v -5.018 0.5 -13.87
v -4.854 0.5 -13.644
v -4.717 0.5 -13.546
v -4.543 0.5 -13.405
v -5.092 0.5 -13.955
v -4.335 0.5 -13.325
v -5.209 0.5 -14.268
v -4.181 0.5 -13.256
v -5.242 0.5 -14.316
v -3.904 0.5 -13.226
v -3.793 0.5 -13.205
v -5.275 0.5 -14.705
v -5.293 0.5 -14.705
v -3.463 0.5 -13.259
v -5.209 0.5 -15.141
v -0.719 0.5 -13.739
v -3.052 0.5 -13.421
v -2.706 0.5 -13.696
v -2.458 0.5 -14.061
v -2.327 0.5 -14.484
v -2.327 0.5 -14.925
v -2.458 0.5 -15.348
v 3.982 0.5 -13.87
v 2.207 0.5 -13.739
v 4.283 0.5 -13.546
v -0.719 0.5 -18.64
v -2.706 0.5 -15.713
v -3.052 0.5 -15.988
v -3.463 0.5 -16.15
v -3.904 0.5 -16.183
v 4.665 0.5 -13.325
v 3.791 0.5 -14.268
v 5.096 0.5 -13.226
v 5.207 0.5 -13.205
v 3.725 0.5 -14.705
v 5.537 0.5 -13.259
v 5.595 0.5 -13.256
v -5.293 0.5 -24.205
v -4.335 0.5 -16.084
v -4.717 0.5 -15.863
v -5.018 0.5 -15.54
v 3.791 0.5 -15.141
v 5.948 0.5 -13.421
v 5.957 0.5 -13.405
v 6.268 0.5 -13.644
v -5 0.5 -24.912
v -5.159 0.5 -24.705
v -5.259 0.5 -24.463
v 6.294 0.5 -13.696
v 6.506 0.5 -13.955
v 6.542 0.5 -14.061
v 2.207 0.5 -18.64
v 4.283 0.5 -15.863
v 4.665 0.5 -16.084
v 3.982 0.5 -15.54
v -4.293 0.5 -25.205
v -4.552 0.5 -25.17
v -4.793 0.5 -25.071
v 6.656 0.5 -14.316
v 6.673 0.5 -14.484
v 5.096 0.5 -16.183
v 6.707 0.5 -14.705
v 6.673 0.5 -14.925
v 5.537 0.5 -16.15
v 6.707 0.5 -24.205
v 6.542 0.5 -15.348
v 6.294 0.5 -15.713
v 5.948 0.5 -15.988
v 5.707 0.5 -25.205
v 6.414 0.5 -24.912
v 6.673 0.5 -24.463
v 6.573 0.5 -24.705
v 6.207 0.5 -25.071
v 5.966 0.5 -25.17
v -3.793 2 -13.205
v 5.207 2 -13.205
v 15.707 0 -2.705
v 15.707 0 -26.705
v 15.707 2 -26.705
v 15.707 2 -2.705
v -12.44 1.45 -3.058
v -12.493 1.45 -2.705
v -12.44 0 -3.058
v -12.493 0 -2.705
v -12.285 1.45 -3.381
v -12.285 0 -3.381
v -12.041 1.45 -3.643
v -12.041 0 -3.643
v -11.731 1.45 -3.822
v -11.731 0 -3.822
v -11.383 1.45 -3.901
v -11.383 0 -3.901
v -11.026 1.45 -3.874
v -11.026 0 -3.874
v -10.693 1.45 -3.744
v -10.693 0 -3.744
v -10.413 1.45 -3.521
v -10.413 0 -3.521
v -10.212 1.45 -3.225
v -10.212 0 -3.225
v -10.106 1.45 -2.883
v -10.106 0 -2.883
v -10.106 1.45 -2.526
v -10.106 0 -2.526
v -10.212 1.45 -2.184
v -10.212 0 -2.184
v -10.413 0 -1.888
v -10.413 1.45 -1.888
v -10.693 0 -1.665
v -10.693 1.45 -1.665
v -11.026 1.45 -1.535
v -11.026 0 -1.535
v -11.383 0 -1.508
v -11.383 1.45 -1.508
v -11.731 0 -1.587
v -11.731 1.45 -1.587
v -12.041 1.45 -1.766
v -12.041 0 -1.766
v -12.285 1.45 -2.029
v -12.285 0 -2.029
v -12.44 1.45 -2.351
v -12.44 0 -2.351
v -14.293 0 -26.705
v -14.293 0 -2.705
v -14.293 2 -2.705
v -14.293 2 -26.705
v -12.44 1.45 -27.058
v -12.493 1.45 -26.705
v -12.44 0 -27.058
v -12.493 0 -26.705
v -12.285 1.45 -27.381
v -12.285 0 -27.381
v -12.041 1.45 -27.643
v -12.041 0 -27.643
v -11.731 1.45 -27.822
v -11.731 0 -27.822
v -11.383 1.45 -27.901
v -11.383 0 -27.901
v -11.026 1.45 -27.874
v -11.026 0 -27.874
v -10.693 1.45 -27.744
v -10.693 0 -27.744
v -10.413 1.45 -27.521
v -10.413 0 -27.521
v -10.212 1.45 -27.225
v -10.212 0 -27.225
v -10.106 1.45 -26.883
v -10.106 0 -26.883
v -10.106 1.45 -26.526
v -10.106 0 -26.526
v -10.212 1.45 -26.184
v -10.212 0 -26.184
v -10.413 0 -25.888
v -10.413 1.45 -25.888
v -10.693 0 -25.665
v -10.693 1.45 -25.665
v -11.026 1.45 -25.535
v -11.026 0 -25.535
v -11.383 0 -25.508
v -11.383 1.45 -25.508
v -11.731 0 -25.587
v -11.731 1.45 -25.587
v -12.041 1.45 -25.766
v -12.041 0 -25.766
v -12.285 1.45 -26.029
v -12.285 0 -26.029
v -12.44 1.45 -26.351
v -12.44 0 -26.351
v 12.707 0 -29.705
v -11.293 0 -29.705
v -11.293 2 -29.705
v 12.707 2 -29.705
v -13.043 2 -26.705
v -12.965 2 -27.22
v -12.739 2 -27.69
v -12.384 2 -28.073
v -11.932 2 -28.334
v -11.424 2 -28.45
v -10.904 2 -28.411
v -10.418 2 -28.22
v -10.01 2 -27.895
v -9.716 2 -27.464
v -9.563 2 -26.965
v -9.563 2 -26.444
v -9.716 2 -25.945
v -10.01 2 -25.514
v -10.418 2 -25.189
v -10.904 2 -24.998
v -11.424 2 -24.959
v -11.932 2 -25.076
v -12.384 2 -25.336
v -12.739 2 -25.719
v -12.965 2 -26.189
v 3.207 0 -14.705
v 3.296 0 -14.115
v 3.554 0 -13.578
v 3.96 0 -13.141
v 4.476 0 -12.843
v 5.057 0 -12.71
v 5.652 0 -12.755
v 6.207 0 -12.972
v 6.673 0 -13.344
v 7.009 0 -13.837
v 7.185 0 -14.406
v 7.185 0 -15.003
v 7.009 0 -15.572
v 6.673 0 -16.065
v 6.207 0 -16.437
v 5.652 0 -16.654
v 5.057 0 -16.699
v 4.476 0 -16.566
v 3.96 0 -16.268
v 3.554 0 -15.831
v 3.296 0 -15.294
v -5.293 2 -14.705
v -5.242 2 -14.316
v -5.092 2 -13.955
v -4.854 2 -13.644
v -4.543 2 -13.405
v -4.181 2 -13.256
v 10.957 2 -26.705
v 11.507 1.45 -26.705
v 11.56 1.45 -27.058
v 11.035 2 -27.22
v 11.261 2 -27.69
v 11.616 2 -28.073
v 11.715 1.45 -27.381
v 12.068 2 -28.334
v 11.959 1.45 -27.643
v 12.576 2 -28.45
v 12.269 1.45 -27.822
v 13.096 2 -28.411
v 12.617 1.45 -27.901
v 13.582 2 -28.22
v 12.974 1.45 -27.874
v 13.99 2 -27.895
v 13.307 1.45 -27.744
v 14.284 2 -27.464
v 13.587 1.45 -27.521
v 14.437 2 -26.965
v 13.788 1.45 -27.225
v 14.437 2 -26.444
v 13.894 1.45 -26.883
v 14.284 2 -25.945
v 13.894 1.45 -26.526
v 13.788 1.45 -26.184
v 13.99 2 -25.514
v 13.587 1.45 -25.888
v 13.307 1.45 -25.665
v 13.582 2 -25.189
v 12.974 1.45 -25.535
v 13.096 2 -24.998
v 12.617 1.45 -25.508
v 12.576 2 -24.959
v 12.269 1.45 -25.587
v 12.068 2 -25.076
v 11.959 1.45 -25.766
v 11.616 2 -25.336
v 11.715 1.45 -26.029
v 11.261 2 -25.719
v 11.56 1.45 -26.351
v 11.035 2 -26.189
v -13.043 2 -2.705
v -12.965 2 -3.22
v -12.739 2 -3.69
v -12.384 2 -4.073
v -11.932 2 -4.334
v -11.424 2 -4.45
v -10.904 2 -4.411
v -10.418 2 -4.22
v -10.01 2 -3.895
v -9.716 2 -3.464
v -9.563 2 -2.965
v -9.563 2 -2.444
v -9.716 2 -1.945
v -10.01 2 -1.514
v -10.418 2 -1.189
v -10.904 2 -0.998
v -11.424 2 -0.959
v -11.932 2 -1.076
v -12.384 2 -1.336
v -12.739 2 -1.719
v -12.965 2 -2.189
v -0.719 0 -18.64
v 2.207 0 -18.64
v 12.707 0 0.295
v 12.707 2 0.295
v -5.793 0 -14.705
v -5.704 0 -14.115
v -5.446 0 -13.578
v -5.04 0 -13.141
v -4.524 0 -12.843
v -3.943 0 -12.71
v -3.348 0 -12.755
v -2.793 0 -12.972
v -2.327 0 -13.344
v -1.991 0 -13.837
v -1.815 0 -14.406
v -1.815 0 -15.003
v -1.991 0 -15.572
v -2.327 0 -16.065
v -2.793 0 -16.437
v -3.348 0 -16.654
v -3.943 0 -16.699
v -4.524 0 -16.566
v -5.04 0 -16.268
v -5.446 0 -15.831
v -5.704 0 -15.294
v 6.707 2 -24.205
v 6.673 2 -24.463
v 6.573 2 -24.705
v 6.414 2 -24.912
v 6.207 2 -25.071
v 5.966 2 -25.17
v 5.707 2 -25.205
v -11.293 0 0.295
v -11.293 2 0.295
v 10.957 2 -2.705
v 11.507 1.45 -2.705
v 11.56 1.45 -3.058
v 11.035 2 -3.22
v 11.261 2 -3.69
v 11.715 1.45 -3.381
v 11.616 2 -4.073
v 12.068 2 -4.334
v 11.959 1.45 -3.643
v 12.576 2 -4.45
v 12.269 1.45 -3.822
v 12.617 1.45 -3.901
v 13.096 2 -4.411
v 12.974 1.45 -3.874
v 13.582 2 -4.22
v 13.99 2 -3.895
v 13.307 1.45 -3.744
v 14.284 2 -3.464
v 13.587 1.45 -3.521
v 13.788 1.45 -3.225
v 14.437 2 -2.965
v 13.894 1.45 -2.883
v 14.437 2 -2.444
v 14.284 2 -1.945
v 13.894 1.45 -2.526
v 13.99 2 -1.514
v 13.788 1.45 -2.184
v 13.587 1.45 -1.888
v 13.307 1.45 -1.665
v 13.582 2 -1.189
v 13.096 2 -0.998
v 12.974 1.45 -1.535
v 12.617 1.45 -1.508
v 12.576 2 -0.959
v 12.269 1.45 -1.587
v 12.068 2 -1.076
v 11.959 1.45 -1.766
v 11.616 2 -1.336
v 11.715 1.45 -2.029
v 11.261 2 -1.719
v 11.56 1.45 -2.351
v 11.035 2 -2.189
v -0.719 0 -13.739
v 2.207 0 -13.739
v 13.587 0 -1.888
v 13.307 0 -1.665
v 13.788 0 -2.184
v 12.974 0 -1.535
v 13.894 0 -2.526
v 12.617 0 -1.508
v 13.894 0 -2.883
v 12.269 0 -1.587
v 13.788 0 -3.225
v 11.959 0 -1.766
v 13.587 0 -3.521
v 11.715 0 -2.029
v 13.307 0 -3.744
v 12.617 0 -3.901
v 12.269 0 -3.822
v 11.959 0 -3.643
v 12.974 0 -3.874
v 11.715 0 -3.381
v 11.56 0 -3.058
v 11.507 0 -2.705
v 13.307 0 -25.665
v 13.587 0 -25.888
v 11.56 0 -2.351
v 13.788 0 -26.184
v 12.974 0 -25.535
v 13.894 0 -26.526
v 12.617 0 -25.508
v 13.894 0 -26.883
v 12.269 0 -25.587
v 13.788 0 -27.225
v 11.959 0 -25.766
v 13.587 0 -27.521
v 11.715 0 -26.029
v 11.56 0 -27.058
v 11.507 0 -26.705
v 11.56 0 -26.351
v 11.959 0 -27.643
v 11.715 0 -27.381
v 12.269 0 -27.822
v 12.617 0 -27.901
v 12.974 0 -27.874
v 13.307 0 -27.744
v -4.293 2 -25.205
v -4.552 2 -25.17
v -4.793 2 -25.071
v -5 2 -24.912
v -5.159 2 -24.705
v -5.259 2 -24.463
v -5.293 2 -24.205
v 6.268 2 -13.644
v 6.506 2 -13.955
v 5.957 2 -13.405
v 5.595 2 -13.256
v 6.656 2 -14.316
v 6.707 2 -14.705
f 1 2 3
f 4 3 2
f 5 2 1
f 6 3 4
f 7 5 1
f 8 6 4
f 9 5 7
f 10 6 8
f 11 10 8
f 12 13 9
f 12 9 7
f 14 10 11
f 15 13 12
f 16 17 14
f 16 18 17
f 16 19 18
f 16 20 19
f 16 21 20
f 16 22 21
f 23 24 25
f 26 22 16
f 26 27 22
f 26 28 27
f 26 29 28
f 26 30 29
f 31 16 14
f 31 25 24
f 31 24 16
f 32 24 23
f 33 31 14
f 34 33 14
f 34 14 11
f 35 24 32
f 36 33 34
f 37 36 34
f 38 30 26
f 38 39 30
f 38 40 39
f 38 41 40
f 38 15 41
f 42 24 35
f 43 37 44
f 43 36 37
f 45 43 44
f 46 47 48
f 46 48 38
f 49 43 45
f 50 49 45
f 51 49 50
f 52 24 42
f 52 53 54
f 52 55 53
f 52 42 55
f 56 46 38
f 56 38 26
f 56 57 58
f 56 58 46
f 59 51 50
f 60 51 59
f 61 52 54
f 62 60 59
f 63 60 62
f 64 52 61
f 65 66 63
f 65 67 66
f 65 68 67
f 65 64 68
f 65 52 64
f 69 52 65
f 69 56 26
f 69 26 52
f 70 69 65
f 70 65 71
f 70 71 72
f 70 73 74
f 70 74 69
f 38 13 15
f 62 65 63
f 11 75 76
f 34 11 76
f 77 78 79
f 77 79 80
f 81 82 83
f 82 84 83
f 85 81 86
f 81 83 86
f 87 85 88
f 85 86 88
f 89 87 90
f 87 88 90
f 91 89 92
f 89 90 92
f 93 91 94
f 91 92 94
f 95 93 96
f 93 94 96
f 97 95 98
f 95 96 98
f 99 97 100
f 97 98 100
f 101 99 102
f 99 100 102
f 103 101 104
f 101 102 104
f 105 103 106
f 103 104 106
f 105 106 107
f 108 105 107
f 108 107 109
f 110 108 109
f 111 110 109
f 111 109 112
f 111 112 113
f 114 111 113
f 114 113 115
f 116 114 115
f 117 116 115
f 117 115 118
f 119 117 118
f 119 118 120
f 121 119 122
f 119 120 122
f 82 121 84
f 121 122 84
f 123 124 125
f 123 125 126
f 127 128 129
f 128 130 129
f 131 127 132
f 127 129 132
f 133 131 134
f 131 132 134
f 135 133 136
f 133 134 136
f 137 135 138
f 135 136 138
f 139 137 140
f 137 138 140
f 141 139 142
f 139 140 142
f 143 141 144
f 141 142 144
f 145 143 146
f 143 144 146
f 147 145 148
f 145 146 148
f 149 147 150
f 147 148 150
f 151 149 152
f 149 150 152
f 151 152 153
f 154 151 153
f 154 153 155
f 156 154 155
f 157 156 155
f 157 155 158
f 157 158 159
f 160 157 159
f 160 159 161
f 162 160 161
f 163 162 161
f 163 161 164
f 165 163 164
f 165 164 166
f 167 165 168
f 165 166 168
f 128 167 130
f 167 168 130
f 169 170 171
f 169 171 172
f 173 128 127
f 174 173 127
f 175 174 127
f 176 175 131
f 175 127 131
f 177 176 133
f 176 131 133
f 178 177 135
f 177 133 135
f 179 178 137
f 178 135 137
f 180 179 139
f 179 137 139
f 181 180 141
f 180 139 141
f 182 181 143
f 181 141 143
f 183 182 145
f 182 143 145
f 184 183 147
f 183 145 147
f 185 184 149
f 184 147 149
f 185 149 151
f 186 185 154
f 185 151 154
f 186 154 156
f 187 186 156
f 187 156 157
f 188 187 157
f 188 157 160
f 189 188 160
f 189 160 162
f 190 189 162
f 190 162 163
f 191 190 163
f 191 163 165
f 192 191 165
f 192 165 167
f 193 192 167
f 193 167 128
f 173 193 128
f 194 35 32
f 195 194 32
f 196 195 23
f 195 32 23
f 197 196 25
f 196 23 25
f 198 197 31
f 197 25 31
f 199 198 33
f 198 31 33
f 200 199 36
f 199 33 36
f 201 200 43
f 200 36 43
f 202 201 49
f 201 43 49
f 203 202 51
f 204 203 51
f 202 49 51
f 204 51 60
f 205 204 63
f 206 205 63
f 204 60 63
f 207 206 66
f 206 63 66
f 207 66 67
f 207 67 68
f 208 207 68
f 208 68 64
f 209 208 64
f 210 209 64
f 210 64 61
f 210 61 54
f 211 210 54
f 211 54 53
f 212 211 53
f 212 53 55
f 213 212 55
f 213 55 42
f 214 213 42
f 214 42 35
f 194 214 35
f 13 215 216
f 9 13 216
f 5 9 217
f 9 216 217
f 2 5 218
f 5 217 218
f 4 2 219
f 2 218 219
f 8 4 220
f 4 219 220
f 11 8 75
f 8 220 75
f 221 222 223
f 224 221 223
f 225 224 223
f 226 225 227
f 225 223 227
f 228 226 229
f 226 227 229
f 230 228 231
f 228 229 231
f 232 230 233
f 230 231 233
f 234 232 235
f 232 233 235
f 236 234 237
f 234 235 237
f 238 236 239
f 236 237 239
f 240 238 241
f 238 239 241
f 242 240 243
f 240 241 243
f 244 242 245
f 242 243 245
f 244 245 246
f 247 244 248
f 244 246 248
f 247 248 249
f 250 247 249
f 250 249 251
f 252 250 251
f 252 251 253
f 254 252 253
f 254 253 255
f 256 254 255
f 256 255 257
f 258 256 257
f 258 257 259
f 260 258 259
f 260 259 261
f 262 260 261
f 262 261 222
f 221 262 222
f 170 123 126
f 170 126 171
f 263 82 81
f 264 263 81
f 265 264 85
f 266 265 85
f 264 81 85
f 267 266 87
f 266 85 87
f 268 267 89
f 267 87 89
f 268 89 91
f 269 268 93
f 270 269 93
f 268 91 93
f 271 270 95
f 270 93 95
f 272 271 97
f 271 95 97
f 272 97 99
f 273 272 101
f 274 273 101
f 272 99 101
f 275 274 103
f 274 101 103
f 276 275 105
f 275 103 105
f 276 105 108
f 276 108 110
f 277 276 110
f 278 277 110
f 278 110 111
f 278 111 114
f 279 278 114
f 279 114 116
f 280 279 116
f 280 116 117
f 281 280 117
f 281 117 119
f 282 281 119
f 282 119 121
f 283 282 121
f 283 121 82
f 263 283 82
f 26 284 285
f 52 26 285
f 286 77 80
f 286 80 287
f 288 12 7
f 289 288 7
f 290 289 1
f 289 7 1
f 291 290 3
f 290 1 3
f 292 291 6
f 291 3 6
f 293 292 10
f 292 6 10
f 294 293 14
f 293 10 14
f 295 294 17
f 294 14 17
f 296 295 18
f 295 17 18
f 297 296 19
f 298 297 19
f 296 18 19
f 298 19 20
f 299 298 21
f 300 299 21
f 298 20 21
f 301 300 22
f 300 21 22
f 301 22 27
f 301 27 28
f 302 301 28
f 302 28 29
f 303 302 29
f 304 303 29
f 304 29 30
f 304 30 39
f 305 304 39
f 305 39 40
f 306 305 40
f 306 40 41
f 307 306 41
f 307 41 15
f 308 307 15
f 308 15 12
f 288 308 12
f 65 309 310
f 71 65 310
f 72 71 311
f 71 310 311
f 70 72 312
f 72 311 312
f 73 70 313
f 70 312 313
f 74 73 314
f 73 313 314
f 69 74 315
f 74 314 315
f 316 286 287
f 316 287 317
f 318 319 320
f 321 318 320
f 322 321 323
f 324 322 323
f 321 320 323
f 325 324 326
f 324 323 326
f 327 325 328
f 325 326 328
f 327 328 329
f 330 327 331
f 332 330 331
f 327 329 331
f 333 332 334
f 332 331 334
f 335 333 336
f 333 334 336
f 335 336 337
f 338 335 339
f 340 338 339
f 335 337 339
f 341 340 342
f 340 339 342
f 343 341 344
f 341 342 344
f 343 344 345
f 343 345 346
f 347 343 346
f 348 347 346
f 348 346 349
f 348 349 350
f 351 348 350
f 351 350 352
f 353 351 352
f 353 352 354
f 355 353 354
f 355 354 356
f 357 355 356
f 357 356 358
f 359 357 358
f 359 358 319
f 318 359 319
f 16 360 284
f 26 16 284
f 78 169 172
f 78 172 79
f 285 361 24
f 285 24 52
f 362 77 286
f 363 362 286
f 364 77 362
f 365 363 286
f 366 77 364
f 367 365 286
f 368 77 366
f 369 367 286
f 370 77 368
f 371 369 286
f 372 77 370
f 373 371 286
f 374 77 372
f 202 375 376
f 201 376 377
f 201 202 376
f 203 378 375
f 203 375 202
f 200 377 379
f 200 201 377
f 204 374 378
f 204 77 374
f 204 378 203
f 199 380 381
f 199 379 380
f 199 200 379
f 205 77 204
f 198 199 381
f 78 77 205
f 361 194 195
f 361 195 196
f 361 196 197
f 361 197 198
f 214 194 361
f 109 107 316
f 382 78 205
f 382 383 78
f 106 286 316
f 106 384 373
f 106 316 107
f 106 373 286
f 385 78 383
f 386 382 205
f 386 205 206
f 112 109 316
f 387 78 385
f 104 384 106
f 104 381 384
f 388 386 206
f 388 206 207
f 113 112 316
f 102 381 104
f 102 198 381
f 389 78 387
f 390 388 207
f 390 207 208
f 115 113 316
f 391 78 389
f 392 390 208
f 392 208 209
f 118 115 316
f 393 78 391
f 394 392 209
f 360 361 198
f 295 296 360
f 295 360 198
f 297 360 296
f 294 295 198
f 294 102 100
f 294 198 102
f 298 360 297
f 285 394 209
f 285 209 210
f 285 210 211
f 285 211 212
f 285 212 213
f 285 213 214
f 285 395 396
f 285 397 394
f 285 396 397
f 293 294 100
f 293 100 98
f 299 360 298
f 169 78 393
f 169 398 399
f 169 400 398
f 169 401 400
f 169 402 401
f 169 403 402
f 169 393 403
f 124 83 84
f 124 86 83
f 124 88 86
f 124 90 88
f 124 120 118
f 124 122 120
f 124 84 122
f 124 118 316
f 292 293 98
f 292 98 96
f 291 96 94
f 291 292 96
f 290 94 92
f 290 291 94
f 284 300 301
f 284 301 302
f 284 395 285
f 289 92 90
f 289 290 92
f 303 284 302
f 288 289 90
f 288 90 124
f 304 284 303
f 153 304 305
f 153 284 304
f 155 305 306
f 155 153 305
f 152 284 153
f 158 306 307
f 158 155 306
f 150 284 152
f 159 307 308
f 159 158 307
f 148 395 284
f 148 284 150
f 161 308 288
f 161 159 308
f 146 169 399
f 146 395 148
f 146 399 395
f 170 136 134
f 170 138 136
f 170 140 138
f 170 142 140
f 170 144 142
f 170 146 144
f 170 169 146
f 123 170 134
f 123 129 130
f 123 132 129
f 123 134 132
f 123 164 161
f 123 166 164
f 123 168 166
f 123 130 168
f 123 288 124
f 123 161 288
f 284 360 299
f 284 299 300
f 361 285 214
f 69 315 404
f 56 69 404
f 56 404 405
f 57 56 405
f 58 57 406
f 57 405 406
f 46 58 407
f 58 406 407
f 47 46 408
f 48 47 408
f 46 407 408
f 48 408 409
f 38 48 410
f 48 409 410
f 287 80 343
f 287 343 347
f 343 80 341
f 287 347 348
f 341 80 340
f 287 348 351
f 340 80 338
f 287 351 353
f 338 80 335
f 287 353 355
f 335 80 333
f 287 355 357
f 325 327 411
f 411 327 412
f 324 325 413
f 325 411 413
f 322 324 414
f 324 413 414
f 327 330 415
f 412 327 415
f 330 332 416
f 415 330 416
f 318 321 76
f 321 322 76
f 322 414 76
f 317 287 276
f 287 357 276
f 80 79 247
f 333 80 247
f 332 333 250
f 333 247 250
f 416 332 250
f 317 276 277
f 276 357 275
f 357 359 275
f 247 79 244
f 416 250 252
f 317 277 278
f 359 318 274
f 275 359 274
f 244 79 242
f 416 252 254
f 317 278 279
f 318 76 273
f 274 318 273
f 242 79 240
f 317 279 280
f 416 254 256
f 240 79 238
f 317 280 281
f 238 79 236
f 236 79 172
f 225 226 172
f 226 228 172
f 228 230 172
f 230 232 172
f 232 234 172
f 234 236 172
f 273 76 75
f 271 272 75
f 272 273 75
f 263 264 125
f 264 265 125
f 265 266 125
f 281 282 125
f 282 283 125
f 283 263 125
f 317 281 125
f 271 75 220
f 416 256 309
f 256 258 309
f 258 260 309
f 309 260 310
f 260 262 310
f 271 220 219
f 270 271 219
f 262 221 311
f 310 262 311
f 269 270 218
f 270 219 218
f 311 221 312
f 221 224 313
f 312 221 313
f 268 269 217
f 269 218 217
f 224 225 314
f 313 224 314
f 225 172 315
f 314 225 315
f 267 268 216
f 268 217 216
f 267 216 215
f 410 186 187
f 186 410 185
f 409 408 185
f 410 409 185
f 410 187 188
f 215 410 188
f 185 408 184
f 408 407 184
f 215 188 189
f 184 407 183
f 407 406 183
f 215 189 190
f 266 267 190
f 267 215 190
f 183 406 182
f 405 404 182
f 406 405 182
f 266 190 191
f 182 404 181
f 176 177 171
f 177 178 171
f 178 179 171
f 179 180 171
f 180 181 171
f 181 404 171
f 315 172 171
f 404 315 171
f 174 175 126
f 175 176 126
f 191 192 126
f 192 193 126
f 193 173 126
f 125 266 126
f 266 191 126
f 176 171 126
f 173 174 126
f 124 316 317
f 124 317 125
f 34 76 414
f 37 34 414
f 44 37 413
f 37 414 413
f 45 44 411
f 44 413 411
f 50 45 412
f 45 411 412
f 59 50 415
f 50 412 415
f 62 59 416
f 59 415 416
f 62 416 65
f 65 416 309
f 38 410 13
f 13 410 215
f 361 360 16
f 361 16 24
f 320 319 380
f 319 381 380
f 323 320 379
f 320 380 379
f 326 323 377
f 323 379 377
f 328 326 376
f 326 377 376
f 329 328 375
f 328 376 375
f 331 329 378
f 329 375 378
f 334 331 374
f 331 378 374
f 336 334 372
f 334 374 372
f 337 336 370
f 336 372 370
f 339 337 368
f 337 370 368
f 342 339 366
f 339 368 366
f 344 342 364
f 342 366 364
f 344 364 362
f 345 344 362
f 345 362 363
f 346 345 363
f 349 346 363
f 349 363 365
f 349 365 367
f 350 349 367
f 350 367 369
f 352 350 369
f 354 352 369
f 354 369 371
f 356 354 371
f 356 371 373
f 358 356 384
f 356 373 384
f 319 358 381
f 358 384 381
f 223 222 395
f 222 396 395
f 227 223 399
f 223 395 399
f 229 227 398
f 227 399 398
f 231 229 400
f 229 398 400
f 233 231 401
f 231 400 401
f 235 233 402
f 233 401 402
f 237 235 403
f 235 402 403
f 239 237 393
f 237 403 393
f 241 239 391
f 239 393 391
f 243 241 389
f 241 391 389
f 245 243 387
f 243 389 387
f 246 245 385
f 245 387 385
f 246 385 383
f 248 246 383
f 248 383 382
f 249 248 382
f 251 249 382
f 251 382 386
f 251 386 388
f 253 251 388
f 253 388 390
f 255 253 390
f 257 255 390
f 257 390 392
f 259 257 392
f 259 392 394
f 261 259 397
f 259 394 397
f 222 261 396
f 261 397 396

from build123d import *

# Parameters (mm, degrees)
SKETCH1_W                                            = 2.925965508
SKETCH1_H                                            = 4.901580006
BOSS_EXTRUDE1_DEPTH                                  = 2
CSK_FOR_M2_FLAT_HEAD_MACHINE_SCREW2_D                = 2.4
CSK_FOR_M2_FLAT_HEAD_MACHINE_SCREW2_DEPTH            = 42.93
CSK_FOR_M2_FLAT_HEAD_MACHINE_SCREW2_CSINK_D          = 3.5
CSK_FOR_M2_FLAT_HEAD_MACHINE_SCREW2_CSINK_ANGLE      = 90
CSK_FOR_M2_FLAT_HEAD_MACHINE_SCREW2_TIP              = 0.721032743
CSK_FOR_M2_CROSS_COUNTERSUNK_HEAD_SCREW1_D           = 2.75
CSK_FOR_M2_CROSS_COUNTERSUNK_HEAD_SCREW1_DEPTH       = 8.7
CSK_FOR_M2_CROSS_COUNTERSUNK_HEAD_SCREW1_CSINK_D     = 4
CSK_FOR_M2_CROSS_COUNTERSUNK_HEAD_SCREW1_CSINK_ANGLE = 92
CSK_FOR_M2_CROSS_COUNTERSUNK_HEAD_SCREW1_TIP         = 0.826183351
CUT_EXTRUDE1_DEPTH                                   = 1.5


with BuildPart() as part:
    # Sketch1 → Boss-Extrude1 (new body)
    with BuildSketch(Plane(origin=(0, 0, 0), x_dir=(1, 0, 0), z_dir=(0, 1, 0))):
        Polygon((-11.293051345, 29.704532022), (12.706948655, 29.704532022), (15.706948655, 26.704532022), (15.706948655, 2.704532022), (12.706948655, -0.295467978), (-11.293051345, -0.295467978), (-14.293051345, 2.704532022), (-14.293051345, 26.704532022), align=None)
        with Locations((0.743965901, 16.189415938)):
            Rectangle(SKETCH1_W, SKETCH1_H, mode=Mode.SUBTRACT)
    extrude(amount=BOSS_EXTRUDE1_DEPTH)

    # CSK for M2 Flat Head Machine Screw2
    with Locations(Plane(origin=(0, 2, 0), x_dir=(1, 0, 0), z_dir=(0, 1, 0))):
        with Locations((-11.293051345, 26.704532022), (-11.293051345, 2.704532022), (12.706948655, 26.704532022), (12.706948655, 2.704532022)):
            CounterSinkHole(CSK_FOR_M2_FLAT_HEAD_MACHINE_SCREW2_D / 2, CSK_FOR_M2_FLAT_HEAD_MACHINE_SCREW2_CSINK_D / 2, depth=CSK_FOR_M2_FLAT_HEAD_MACHINE_SCREW2_DEPTH, counter_sink_angle=CSK_FOR_M2_FLAT_HEAD_MACHINE_SCREW2_CSINK_ANGLE)
            with Locations((0, 0, -(CSK_FOR_M2_FLAT_HEAD_MACHINE_SCREW2_DEPTH + CSK_FOR_M2_FLAT_HEAD_MACHINE_SCREW2_TIP / 2))):  # 118° drill point
                Cone(0, CSK_FOR_M2_FLAT_HEAD_MACHINE_SCREW2_D / 2, CSK_FOR_M2_FLAT_HEAD_MACHINE_SCREW2_TIP, mode=Mode.SUBTRACT)

    # CSK for M2 Cross Countersunk Head Screw1
    with Locations(Plane.XZ):
        with Locations((-3.793051345, -14.704532022), (5.206948655, -14.704532022)):
            CounterSinkHole(CSK_FOR_M2_CROSS_COUNTERSUNK_HEAD_SCREW1_D / 2, CSK_FOR_M2_CROSS_COUNTERSUNK_HEAD_SCREW1_CSINK_D / 2, depth=CSK_FOR_M2_CROSS_COUNTERSUNK_HEAD_SCREW1_DEPTH, counter_sink_angle=CSK_FOR_M2_CROSS_COUNTERSUNK_HEAD_SCREW1_CSINK_ANGLE)
            with Locations((0, 0, -(CSK_FOR_M2_CROSS_COUNTERSUNK_HEAD_SCREW1_DEPTH + CSK_FOR_M2_CROSS_COUNTERSUNK_HEAD_SCREW1_TIP / 2))):  # 118° drill point
                Cone(0, CSK_FOR_M2_CROSS_COUNTERSUNK_HEAD_SCREW1_D / 2, CSK_FOR_M2_CROSS_COUNTERSUNK_HEAD_SCREW1_TIP, mode=Mode.SUBTRACT)

    # Sketch11 → Cut-Extrude1 (cut)
    with BuildSketch(Plane(origin=(0, 2, 0), x_dir=(1, 0, 0), z_dir=(0, 1, 0))):
        with BuildLine():
            Line((-5.293051345, 24.204532022), (-5.293051345, 14.704532022))
            ThreePointArc((-5.293051345, 14.704532022), (-4.853711517, 13.64387185), (-3.793051345, 13.204532022))
            Line((-3.793051345, 13.204532022), (5.206948655, 13.204532022))
            ThreePointArc((5.206948655, 13.204532022), (6.267608827, 13.64387185), (6.706948655, 14.704532022))
            Line((6.706948655, 14.704532022), (6.706948655, 24.204532022))
            ThreePointArc((6.706948655, 24.204532022), (6.414055436, 24.911638803), (5.706948655, 25.204532022))
            Line((5.706948655, 25.204532022), (-4.293051345, 25.204532022))
            ThreePointArc((-4.293051345, 25.204532022), (-5.000158126, 24.911638803), (-5.293051345, 24.204532022))
        make_face()
    extrude(amount=-CUT_EXTRUDE1_DEPTH, mode=Mode.SUBTRACT)


solid = part.part
